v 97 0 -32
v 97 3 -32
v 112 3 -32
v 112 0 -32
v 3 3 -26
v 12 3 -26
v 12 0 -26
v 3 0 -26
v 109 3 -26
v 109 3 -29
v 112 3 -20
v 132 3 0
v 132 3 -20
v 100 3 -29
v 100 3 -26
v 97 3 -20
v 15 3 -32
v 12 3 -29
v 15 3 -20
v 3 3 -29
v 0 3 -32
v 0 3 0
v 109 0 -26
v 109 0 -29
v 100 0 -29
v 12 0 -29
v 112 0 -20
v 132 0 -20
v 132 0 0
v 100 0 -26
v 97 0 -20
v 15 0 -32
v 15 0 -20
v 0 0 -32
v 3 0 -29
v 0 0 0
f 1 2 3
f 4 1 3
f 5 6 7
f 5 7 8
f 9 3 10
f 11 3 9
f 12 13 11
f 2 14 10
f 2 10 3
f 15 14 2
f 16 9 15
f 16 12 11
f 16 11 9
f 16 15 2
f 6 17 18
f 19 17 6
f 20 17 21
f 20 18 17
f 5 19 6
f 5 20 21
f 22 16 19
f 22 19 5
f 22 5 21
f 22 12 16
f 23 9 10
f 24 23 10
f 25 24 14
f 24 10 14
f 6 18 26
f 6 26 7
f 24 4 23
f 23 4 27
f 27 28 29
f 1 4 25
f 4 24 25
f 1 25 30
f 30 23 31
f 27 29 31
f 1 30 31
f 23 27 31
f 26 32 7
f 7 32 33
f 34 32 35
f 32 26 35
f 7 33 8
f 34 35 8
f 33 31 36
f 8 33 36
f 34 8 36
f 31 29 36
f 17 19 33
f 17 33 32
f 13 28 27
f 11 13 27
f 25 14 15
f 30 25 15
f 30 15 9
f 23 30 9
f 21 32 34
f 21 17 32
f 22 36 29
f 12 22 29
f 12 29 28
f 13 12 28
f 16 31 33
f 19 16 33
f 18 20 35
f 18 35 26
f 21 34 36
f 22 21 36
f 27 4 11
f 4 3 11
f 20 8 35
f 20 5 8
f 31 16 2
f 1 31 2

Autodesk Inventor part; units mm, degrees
ref_plane "YZ Plane" through (0, 0, 0) normal (1, 0, 0) x (0, 1, 0)
ref_plane "XZ Plane" through (0, 0, 0) normal (0, 1, 0) x (-1, 0, 0)
ref_plane "XY Plane" through (0, 0, 0) normal (0, 0, 1) x (1, 0, 0)
sketch "Sketch1" plane through (0, 0, 0) normal (0, 1, 0) x (-1, 0, 0)
  point P0 (0, 0)
sketch "Sketch2" plane through (0, 0, 0) normal (0, 1, 0) x (-1, 0, 0)
  line L0 (0, 0) -> (-132, 0)
  line L1 (-132, 0) -> (-132, -20)
  line L2 (-132, -20) -> (0, -20)
  line L3 (0, -20) -> (0, 0)
  dimension "d0" = 132
  dimension "d1" = 20
extrude "Extrusion1" add sketch "Sketch2" along normal blind 3
sketch "Sketch3" plane through (0, 3, 0) normal (0, 1, 0) x (1, 0, 0)
  line L0 (132, 20) -> (0, 20) projected
  line L1 (0, 20) -> (15, 20)
  line L2 (15, 20) -> (15, 32)
  line L3 (15, 32) -> (0, 32)
  line L4 (0, 32) -> (0, 20)
  line L5 (3, 29) -> (12, 29)
  line L6 (12, 29) -> (12, 26)
  line L7 (12, 26) -> (3, 26)
  line L8 (3, 26) -> (3, 29)
  line L9 (132, 0) -> (132, 20)
  line L10 (112, 20) -> (97, 20)
  line L11 (97, 20) -> (97, 32)
  line L12 (97, 32) -> (112, 32)
  line L13 (112, 32) -> (112, 20)
  line L14 (109, 29) -> (100, 29)
  line L15 (100, 29) -> (100, 26)
  line L16 (100, 26) -> (109, 26)
  line L17 (109, 26) -> (109, 29)
  point P0 (0, 0)
  dimension "d4" = 15
  dimension "d8" = 3
  dimension "d9" = 3
  dimension "d10" = 3
  dimension "d11" = 6
  dimension "d12" = 3
  dimension "d13" = 15
  dimension "d14" = 3
  dimension "d15" = 3
  dimension "d16" = 3
  dimension "d17" = 3
  dimension "d18" = 6
  dimension "d19" = 82
extrude "Extrusion2" add sketch "Sketch3" against normal blind 3
equation "\"d9\" = d8"
equation "\"d10\" = d8"
equation "\"d16\" = d15"
equation "\"d17\" = d15"
properties part number "ball-reload-right"
